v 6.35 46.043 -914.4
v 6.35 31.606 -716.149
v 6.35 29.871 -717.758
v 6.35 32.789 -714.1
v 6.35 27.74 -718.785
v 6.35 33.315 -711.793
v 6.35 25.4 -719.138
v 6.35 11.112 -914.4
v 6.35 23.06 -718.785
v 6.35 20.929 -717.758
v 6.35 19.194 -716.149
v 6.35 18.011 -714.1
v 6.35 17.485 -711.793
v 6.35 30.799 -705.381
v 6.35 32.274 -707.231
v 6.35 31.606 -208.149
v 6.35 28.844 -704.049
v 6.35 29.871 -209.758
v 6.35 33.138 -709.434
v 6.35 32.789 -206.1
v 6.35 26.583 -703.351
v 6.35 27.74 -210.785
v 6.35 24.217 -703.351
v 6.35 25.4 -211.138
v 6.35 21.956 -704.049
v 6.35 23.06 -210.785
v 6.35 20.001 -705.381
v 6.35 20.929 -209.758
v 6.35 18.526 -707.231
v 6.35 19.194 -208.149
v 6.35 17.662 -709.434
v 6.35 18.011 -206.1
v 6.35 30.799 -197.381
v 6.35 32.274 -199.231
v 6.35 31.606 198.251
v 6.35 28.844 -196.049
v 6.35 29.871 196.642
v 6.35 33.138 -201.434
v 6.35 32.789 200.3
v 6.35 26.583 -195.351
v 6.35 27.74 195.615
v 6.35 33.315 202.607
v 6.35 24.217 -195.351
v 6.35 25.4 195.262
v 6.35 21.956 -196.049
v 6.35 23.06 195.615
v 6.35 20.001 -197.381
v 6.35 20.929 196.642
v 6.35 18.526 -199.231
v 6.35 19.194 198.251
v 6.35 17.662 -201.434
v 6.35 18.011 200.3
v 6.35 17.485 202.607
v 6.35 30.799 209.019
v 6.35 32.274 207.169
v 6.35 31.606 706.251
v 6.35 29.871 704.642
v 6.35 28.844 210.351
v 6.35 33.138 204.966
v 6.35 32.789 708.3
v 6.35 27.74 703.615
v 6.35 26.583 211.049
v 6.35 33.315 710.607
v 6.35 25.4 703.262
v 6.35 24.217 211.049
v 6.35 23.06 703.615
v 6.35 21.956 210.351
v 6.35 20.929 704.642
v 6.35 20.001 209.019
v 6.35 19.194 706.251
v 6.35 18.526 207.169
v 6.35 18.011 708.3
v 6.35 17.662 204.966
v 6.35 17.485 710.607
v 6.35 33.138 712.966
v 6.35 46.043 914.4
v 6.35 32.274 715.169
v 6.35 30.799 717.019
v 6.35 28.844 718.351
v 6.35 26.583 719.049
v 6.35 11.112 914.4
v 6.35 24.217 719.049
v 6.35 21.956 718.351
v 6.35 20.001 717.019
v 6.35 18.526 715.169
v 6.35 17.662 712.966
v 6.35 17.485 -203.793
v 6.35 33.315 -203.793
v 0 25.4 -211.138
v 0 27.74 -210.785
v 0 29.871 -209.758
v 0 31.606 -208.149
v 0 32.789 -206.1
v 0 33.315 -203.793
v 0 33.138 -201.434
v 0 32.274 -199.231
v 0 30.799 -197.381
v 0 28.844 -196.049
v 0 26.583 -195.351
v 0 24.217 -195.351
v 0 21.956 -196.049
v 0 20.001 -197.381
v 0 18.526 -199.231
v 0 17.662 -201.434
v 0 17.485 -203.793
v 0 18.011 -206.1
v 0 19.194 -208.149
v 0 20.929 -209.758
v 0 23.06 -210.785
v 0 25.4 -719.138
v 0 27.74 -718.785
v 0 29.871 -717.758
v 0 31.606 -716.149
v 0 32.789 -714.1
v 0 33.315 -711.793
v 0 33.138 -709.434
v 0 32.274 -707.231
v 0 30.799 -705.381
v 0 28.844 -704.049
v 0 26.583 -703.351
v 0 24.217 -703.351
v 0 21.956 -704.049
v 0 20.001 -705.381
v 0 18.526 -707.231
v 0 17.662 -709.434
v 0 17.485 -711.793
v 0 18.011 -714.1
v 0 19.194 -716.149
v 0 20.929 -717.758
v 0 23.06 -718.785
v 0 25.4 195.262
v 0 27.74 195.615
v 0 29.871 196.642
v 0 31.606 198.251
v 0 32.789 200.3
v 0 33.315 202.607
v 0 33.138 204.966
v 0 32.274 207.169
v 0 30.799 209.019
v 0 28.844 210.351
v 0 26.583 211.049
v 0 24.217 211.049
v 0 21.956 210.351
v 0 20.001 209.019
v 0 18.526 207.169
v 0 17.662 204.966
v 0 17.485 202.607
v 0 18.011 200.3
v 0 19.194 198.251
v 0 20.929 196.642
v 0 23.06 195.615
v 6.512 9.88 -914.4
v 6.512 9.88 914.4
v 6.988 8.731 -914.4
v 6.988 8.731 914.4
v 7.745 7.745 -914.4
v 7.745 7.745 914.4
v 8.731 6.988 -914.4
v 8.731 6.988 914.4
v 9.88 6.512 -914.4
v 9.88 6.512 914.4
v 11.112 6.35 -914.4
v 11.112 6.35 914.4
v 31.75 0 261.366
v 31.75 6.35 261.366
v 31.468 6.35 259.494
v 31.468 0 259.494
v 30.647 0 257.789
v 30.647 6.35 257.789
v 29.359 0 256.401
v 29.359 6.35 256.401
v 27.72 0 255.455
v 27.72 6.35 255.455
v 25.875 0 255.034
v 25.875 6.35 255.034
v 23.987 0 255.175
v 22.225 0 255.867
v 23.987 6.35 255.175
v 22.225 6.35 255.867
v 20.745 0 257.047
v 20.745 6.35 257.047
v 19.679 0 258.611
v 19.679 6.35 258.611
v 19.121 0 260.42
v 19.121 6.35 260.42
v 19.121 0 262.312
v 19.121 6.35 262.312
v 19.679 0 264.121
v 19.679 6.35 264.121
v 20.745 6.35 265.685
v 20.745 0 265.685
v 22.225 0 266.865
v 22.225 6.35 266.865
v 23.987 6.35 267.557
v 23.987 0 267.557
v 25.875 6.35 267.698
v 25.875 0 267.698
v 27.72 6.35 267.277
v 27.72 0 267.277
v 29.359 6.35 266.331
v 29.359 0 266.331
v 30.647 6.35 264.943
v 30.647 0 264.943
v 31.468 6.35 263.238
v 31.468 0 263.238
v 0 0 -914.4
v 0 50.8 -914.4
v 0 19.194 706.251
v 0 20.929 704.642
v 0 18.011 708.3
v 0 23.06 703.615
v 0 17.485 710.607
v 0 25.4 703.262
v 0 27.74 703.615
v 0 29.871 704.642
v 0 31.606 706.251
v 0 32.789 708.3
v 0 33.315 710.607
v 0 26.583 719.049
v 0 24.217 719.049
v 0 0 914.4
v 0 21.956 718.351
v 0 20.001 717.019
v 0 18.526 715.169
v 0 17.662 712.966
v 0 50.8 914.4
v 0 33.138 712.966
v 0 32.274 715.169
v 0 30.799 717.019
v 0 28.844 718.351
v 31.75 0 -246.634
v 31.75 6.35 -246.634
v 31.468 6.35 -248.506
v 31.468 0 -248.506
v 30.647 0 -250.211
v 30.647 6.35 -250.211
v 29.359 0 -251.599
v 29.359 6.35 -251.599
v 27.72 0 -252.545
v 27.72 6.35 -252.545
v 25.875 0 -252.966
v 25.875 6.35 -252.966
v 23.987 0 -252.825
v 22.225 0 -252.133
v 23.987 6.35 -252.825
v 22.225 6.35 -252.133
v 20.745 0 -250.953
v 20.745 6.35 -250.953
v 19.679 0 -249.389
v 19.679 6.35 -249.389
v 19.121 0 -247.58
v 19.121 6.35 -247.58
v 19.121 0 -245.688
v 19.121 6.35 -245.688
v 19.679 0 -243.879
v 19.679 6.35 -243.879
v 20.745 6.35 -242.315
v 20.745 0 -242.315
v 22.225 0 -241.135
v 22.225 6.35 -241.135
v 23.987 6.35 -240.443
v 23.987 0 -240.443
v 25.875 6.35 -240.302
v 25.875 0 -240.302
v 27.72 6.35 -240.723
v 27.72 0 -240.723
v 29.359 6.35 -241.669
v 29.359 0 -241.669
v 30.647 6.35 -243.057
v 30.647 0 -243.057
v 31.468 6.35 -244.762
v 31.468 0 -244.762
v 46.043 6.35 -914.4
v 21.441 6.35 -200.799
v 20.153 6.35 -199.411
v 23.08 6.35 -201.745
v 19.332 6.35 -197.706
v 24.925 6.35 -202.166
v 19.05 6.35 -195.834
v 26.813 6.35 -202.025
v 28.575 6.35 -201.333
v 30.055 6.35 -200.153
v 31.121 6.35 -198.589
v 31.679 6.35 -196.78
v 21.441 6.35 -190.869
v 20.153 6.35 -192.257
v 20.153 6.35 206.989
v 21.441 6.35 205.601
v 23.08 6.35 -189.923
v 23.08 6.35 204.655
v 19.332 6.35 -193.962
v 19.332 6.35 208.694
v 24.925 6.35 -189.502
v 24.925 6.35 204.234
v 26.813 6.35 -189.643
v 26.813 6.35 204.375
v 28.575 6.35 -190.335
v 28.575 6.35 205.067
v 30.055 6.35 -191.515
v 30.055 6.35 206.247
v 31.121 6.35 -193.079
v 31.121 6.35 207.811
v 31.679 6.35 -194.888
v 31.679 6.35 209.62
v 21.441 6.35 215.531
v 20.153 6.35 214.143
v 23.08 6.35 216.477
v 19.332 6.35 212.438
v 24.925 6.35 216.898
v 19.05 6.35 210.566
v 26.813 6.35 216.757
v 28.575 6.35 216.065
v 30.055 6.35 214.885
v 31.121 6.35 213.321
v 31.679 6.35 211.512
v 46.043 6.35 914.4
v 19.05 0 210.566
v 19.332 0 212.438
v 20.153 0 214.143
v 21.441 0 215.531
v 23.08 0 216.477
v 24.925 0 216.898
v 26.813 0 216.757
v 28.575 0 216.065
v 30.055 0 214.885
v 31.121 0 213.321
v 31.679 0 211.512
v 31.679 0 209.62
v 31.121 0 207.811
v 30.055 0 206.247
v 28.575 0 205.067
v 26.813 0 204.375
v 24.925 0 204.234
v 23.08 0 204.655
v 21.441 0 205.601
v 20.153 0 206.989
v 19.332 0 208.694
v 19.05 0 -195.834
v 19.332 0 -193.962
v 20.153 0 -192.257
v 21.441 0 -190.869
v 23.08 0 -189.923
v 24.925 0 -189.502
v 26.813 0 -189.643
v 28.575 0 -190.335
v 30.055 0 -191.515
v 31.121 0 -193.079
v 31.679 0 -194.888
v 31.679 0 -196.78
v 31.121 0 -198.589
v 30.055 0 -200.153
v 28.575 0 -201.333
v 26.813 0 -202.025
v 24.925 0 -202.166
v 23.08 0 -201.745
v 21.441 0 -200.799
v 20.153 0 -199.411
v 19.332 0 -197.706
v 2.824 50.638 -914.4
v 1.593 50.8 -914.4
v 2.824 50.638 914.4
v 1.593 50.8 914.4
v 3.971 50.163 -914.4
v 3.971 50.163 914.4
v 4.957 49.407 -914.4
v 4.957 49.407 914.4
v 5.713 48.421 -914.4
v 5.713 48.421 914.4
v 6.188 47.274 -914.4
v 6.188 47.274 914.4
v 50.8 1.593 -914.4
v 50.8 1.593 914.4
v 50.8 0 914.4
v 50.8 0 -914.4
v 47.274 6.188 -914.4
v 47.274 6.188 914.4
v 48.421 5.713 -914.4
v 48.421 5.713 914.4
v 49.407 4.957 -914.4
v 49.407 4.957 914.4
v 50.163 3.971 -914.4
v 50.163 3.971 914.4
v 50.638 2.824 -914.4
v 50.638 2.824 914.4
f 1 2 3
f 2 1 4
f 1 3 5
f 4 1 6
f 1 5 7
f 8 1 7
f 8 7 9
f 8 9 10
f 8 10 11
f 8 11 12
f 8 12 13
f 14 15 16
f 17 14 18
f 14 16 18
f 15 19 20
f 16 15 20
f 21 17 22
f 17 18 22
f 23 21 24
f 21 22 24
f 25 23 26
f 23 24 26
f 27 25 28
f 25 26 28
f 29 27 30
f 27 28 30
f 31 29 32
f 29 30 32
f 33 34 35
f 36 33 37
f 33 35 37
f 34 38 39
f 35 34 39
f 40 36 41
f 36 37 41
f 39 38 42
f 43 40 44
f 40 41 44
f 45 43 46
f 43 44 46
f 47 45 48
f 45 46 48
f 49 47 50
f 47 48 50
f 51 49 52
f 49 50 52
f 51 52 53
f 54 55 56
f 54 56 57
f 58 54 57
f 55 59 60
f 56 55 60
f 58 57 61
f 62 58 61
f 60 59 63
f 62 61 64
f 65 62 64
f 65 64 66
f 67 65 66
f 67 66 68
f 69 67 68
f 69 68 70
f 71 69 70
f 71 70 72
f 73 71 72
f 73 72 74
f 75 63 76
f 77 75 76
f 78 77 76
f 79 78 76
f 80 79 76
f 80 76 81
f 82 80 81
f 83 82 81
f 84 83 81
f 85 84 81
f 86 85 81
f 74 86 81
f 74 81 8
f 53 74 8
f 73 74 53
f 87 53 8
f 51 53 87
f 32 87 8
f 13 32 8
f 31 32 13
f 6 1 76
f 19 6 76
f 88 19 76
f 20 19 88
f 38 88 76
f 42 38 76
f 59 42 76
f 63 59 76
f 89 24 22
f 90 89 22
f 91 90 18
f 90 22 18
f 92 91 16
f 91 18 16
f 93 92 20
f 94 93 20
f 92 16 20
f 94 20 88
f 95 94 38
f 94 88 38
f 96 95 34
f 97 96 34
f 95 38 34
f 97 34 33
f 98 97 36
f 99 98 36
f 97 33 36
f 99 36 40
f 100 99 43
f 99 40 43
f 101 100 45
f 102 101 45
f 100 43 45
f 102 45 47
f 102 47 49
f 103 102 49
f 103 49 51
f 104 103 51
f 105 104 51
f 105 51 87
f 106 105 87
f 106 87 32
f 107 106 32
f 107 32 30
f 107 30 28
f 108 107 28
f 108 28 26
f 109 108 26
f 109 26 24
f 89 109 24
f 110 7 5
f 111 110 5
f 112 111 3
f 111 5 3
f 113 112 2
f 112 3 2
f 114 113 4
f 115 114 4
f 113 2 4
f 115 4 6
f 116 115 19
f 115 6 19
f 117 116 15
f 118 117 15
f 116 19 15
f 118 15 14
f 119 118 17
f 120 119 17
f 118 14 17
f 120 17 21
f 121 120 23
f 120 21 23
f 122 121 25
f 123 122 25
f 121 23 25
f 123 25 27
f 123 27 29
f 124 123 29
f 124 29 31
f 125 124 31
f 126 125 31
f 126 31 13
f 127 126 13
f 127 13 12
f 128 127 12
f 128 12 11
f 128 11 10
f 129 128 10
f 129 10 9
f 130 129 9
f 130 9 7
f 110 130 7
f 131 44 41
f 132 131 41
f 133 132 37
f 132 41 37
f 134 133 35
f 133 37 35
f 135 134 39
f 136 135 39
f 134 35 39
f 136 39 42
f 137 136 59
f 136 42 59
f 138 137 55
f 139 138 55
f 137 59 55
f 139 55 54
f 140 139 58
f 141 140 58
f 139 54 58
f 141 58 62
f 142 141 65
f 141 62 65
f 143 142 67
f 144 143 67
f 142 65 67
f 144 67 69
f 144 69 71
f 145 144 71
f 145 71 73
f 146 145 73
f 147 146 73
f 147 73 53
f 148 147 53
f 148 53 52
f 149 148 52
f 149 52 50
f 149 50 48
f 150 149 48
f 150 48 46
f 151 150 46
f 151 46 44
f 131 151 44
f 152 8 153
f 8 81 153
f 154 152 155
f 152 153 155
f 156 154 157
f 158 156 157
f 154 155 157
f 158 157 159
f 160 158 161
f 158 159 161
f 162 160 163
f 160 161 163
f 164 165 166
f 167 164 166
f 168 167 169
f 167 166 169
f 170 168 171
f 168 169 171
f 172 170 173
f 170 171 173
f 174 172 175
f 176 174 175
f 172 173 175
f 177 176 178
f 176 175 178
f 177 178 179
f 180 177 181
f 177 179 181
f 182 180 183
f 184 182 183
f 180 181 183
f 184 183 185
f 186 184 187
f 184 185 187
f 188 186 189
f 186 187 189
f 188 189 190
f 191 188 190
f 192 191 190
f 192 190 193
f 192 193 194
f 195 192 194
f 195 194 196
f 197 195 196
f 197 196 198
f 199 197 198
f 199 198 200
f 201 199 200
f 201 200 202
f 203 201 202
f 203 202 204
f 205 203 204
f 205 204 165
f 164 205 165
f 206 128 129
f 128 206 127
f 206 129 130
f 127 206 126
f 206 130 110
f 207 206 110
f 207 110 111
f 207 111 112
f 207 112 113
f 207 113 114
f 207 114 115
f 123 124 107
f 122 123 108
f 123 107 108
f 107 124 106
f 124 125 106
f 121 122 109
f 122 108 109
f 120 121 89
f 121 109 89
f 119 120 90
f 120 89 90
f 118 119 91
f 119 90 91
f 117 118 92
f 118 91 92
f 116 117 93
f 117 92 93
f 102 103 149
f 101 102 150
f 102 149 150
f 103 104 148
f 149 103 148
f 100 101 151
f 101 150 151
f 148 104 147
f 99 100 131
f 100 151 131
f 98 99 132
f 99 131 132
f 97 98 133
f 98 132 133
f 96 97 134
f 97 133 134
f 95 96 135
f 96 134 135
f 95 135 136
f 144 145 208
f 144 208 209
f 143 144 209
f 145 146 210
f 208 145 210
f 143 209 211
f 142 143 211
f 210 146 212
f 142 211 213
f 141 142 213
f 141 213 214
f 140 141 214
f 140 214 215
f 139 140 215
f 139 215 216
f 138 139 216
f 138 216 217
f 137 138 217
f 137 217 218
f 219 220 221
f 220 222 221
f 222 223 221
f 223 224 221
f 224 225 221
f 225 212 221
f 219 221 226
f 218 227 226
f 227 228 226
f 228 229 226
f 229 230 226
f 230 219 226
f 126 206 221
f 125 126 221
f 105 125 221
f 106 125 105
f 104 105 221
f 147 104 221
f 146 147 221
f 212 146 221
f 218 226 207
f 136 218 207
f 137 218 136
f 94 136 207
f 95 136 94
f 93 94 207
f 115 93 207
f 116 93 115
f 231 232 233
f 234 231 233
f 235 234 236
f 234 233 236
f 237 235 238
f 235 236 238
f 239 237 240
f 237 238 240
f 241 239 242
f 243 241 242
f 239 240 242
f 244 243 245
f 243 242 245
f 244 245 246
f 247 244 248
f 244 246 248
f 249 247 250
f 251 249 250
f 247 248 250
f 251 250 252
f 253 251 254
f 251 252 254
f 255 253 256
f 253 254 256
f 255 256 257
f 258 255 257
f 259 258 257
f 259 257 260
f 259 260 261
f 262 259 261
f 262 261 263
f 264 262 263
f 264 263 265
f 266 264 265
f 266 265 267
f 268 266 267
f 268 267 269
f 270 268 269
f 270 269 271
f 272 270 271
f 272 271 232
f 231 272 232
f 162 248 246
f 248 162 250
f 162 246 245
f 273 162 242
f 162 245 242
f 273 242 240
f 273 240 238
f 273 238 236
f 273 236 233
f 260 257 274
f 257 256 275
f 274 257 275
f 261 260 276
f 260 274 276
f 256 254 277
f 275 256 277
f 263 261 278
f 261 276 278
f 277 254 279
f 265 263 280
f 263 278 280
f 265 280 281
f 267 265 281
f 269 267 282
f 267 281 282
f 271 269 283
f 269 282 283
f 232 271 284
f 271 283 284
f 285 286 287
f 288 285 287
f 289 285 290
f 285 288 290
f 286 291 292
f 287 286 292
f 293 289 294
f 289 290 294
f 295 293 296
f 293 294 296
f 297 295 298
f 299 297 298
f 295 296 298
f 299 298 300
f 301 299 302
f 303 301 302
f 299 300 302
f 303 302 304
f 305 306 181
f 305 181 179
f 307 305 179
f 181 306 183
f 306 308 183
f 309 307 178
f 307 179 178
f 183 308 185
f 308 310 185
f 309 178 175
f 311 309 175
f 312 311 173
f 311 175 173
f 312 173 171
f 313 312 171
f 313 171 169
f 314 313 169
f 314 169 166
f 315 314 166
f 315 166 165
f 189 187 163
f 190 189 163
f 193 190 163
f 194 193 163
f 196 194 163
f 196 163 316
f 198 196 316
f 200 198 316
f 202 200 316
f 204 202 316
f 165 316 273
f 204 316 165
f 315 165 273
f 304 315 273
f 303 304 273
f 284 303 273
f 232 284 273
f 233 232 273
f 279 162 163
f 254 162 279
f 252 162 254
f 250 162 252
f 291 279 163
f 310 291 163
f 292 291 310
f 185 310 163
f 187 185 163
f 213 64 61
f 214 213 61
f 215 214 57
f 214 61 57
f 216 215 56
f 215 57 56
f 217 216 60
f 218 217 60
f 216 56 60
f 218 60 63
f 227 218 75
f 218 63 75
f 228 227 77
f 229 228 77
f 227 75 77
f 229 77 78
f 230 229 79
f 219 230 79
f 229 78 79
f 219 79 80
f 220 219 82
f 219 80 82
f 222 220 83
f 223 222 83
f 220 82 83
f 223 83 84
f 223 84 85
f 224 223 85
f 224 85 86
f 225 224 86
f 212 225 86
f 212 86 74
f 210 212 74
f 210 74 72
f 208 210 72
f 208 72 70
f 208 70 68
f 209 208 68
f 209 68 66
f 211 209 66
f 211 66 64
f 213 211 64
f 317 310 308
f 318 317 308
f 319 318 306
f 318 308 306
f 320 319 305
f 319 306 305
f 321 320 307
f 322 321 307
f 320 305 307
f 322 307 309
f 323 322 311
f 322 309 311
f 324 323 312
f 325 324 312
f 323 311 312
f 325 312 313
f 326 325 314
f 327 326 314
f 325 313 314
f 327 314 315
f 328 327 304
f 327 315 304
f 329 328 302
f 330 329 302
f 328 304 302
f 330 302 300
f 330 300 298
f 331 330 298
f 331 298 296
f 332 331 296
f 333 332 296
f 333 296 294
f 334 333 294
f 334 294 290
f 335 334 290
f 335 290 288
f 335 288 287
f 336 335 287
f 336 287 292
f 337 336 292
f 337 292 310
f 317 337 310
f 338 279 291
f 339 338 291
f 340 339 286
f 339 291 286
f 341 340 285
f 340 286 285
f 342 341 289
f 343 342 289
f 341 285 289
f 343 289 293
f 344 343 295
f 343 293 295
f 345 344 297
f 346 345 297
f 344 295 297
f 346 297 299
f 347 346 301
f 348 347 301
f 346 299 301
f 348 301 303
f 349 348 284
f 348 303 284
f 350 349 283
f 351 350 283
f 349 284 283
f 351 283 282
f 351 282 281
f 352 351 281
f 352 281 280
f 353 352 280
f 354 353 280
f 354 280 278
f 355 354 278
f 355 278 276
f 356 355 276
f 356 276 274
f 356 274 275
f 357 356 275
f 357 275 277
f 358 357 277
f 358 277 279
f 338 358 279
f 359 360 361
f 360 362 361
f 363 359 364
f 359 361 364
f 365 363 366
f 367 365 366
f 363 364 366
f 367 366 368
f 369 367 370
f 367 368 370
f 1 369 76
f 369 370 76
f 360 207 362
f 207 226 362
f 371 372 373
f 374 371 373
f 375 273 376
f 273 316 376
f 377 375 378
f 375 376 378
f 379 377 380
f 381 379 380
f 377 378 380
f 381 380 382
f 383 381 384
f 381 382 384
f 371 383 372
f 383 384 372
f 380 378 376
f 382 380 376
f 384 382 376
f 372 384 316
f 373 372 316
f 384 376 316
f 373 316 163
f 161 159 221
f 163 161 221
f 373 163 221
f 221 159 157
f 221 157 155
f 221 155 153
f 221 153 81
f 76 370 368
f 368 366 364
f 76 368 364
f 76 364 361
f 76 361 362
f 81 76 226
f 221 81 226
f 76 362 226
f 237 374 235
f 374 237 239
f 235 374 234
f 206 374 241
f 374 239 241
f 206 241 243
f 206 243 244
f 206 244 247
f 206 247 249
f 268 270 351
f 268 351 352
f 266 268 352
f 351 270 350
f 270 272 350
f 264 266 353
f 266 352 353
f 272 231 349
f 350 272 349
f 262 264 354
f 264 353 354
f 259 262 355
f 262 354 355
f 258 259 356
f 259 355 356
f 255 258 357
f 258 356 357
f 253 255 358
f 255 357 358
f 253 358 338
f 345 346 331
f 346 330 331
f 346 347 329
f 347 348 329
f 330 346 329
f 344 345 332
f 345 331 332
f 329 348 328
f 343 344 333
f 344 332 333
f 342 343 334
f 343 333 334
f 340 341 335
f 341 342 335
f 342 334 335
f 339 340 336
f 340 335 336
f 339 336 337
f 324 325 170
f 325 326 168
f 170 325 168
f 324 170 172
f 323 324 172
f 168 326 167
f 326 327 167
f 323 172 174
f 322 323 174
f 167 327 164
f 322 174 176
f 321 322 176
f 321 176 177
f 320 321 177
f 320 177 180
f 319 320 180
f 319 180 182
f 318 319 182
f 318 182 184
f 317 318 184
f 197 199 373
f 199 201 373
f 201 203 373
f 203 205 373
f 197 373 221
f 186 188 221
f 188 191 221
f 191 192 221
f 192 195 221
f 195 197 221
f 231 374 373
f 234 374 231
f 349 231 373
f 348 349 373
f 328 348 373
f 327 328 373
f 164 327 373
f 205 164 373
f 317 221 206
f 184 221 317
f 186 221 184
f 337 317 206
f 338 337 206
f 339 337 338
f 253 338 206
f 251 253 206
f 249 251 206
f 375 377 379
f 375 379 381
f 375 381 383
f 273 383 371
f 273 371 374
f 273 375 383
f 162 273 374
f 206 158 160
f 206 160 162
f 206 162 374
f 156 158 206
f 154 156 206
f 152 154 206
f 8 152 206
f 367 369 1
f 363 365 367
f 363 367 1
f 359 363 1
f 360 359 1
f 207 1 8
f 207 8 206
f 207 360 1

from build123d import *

# Parameters (mm, degrees)
BOSS_EXTRUDE1_DEPTH                 = 914.4
F_13_16_0_8125_DIAMETER_HOLE1_D     = 12.7
F_13_16_0_8125_DIAMETER_HOLE1_DEPTH = 6.35
F_5_8_0_625_DIAMETER_HOLE1_D        = 15.875
F_5_8_0_625_DIAMETER_HOLE1_DEPTH    = 6.35
SKETCH7_R                           = 6.35
CUT_EXTRUDE1_DEPTH                  = 7.35


with BuildPart() as part:
    # Sketch1 → Boss-Extrude1 (new body, symmetric)
    with BuildSketch(Plane.XY):
        with BuildLine():
            Line((0, 0), (0, 50.8))
            Line((0, 50.8), (1.59258, 50.8))
            ThreePointArc((1.59258, 50.8), (4.956583943, 49.406583943), (6.35, 46.04258))
            Line((6.35, 46.04258), (6.35, 11.1125))
            ThreePointArc((6.35, 11.1125), (7.744903955, 7.744903955), (11.1125, 6.35))
            Line((11.1125, 6.35), (46.04258, 6.35))
            ThreePointArc((46.04258, 6.35), (49.406583943, 4.956583943), (50.8, 1.59258))
            Line((50.8, 1.59258), (50.8, 0))
            Line((50.8, 0), (0, 0))
        make_face()
    extrude(amount=BOSS_EXTRUDE1_DEPTH, both=True)

    # 13/16 (0.8125) Diameter Hole1
    with Locations(Plane.XZ):
        with Locations((25.4, -195.834), (25.4, 210.566)):
            Hole(F_13_16_0_8125_DIAMETER_HOLE1_D / 2, depth=F_13_16_0_8125_DIAMETER_HOLE1_DEPTH)

    # 5/8 (0.625) Diameter Hole1
    with Locations(Plane.ZY):
        with Locations((-711.2, 25.4), (-203.2, 25.4), (203.2, 25.4), (711.2, 25.4)):
            Hole(F_5_8_0_625_DIAMETER_HOLE1_D / 2, depth=F_5_8_0_625_DIAMETER_HOLE1_DEPTH)

    # Sketch7 → Cut-Extrude1 (cut, through all)
    with BuildSketch(Plane(origin=(0, 6.35, 0), x_dir=(1, 0, 0), z_dir=(0, 1, 0))):
        with Locations((25.4, 246.634)):
            Circle(SKETCH7_R)
        with Locations((25.4, -261.366)):
            Circle(SKETCH7_R)
    extrude(amount=-CUT_EXTRUDE1_DEPTH, mode=Mode.SUBTRACT)


solid = part.part
